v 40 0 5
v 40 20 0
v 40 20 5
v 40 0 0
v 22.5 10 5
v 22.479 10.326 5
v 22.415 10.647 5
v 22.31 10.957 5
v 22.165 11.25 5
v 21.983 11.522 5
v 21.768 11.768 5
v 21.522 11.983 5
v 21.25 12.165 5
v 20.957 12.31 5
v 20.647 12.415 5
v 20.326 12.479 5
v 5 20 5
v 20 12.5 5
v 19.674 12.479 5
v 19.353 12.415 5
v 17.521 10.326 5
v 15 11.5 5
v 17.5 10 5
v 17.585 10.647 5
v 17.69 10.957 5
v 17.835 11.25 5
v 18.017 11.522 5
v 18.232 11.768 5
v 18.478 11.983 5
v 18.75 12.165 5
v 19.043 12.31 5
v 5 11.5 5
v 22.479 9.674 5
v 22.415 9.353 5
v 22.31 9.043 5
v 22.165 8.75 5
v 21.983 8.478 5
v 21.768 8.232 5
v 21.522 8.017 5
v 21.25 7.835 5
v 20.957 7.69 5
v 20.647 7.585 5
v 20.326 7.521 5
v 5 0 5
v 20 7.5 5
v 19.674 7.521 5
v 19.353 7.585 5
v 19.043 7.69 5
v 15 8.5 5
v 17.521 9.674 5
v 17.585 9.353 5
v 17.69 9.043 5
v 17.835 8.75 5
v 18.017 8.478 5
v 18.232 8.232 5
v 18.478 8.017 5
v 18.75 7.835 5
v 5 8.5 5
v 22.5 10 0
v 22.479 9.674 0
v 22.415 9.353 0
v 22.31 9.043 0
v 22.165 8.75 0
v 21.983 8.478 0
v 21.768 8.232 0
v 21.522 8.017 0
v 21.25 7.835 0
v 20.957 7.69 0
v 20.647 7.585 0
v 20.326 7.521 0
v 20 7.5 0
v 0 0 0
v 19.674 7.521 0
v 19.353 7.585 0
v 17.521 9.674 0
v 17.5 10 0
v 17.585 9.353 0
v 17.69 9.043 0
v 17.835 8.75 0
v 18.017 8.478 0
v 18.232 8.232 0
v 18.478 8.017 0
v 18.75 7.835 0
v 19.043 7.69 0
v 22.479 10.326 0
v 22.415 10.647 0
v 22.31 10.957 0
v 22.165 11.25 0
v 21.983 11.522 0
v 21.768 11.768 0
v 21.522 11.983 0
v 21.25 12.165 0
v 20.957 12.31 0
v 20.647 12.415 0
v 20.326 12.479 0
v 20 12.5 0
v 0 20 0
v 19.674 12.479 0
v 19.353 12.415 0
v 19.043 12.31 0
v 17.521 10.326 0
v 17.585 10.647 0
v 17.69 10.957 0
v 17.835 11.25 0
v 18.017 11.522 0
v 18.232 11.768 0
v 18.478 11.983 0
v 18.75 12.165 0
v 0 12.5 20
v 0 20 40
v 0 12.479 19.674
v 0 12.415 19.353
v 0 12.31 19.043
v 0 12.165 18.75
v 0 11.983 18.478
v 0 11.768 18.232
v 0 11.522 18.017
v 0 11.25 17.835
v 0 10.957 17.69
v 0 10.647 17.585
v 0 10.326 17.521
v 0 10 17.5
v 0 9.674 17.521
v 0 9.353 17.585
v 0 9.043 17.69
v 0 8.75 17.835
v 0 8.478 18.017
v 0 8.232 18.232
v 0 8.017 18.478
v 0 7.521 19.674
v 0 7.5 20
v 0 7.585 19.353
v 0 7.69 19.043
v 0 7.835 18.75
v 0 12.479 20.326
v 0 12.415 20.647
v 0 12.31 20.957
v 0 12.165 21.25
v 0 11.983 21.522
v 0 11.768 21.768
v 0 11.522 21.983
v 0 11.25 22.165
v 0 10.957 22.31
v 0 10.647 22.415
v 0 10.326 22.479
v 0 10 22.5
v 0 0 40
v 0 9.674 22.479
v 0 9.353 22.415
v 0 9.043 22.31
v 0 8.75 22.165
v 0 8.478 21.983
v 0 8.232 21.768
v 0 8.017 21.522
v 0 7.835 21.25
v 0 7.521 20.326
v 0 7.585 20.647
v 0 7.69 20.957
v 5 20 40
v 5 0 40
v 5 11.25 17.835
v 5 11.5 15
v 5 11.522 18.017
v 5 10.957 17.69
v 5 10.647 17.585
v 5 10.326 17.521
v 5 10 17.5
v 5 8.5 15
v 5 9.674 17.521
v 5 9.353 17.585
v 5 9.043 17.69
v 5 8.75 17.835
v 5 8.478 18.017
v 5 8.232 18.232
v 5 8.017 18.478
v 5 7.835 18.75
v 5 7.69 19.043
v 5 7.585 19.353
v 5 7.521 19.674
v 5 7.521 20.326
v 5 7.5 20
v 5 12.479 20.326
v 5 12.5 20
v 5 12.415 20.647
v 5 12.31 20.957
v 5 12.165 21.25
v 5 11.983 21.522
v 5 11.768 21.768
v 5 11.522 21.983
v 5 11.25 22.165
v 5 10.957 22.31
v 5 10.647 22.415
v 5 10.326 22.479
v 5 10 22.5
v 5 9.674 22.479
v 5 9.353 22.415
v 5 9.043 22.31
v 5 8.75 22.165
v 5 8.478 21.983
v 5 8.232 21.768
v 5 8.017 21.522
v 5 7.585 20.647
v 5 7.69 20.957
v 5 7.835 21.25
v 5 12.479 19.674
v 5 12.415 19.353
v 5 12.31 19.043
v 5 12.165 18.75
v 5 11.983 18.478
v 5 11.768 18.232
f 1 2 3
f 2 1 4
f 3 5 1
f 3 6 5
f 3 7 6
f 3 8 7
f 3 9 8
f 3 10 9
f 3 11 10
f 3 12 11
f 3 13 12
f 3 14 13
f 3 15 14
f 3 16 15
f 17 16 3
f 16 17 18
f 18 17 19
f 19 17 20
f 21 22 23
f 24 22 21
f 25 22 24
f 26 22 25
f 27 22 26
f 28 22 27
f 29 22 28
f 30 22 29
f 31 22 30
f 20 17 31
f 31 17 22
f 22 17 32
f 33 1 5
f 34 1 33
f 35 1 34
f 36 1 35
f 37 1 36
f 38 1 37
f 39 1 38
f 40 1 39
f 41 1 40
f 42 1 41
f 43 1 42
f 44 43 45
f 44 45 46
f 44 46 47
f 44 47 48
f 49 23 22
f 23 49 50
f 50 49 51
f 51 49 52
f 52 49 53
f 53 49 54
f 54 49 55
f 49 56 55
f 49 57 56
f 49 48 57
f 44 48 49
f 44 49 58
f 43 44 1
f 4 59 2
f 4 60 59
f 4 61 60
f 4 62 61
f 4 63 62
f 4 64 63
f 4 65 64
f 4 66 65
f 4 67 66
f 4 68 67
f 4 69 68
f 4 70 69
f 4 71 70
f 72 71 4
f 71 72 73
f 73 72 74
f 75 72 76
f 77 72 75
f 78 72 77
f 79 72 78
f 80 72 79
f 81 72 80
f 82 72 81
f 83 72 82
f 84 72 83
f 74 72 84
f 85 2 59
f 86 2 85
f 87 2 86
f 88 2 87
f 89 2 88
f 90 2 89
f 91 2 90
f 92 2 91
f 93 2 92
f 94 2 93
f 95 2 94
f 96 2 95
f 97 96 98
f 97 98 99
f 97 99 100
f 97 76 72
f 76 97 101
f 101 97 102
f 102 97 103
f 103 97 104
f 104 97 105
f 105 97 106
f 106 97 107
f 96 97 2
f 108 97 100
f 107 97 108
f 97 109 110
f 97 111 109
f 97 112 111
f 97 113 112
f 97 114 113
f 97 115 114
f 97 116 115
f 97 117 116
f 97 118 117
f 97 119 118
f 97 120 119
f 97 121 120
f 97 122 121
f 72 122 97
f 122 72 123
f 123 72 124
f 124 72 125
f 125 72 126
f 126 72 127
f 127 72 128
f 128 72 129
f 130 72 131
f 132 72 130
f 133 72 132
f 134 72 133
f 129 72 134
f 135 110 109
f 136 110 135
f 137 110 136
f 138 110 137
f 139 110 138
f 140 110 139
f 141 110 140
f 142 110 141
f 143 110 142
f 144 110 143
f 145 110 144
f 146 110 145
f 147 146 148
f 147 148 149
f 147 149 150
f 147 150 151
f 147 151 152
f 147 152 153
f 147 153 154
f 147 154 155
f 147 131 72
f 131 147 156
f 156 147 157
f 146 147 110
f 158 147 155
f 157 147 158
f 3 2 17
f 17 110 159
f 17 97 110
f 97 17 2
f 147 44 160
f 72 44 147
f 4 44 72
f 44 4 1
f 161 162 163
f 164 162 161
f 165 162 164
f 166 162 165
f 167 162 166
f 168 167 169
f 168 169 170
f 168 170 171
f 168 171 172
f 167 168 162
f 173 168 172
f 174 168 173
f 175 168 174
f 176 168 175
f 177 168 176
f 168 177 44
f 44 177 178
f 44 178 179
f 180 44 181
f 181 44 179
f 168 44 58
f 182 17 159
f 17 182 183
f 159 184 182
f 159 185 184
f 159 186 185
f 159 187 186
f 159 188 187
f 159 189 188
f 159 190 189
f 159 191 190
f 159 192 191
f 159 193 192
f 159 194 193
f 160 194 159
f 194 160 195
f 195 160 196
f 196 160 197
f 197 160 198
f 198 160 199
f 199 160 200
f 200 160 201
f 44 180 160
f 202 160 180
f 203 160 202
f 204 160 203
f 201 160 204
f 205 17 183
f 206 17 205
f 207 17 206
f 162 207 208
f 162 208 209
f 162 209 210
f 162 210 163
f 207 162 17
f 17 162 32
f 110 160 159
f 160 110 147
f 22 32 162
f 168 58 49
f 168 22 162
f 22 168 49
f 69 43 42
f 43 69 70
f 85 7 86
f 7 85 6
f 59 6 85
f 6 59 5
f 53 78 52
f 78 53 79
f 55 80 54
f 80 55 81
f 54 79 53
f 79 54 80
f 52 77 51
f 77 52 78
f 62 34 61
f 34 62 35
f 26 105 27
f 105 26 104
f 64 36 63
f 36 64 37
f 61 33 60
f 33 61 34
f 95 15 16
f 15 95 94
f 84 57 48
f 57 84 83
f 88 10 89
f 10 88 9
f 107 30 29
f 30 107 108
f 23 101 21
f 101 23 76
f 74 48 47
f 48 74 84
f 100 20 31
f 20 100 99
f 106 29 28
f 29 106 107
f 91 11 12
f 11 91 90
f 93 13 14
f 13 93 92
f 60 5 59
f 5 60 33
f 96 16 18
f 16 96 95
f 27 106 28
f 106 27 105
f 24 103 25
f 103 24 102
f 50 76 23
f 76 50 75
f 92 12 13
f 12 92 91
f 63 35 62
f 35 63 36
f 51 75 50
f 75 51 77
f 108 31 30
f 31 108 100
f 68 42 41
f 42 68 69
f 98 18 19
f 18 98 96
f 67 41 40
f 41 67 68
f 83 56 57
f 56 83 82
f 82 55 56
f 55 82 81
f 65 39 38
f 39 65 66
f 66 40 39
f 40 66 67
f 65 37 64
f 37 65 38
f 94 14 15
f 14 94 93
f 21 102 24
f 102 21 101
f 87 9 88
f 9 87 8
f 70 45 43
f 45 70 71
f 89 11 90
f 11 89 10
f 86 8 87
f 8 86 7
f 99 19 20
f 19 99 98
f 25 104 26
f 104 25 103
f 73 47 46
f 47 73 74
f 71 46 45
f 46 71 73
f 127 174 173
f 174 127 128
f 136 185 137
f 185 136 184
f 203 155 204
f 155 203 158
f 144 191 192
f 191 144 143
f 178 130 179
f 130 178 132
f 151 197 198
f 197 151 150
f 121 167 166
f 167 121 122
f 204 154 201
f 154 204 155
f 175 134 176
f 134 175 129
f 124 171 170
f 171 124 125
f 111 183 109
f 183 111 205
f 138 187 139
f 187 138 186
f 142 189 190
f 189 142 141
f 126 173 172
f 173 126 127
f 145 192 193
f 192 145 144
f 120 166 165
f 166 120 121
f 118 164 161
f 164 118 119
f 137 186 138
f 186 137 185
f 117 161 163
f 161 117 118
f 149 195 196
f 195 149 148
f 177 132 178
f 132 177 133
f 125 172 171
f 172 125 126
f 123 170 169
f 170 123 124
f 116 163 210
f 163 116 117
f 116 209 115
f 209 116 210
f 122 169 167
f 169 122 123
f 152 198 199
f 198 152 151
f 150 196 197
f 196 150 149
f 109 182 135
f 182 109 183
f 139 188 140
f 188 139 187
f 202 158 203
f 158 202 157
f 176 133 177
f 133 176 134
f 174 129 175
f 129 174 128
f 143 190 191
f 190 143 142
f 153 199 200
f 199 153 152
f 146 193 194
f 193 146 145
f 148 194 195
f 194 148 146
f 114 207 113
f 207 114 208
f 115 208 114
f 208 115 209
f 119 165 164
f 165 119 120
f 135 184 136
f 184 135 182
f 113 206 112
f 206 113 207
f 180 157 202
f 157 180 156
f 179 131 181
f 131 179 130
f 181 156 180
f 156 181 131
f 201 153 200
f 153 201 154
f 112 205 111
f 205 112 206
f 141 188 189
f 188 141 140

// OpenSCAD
// 2020 extrusion corner bracket
// A right-angle bracket for bolting two lengths of 2020 aluminium extrusion
// together. Written as a Datum seed part: everything configurable is declared
// with Customizer annotations, and it depends on no external libraries.

/* [Bracket] */
// Length of each arm
arm = 40; // [20:5:80]
// Thickness of the bracket body
thickness = 5; // [3:0.5:10]
// Width across the bracket
width = 20; // [10:1:40]

/* [Fasteners] */
// Bolt diameter
bolt_d = 5; // [3:0.5:8]
// Distance from the inside corner to the first hole
first_hole = 20; // [10:1:30]
// Bolt holes per arm
holes = 1; // [1:1:3]
// Centre-to-centre spacing between holes
hole_pitch = 20; // [10:1:40]

/* [Reinforcement] */
// Add a triangular gusset between the arms
gusset = true;
// Gusset thickness
gusset_t = 3; // [2:0.5:6]

/* [Hidden] */
eps = 0.01;
$fn = 48;

module arm_holes() {
    for (i = [0 : holes - 1])
        translate([first_hole + i * hole_pitch, width / 2, -eps])
            cylinder(d = bolt_d, h = thickness + 2 * eps);
}

// The gusset must stop short of the first bolt hole, or the bolt cannot be
// fitted. Deriving its length from first_hole keeps that true at every setting
// rather than only at the defaults.
gusset_len = max(thickness + 2, min(arm * 0.6, first_hole - bolt_d));

module gusset_shape() {
    translate([0, (width + gusset_t) / 2, 0])
        rotate([90, 0, 0])
            linear_extrude(gusset_t)
                polygon([
                    [thickness, thickness],
                    [gusset_len, thickness],
                    [thickness, gusset_len]
                ]);
}

// The last hole must sit fully inside the arm. Without this, an over-ambitious
// hole count silently produces a bracket with a slot cut out of its end -- the
// kind of quiet wrongness you only discover after printing it.
assert(
    first_hole + (holes - 1) * hole_pitch + bolt_d / 2 <= arm - 1,
    "The last bolt hole falls outside the arm. Lengthen the arm, or reduce holes, hole_pitch or first_hole."
);

module bracket() {
    difference() {
        union() {
            cube([arm, width, thickness]);
            cube([thickness, width, arm]);
            if (gusset) gusset_shape();
        }
        // Holes through the horizontal arm, drilled downwards.
        arm_holes();
        // Holes through the vertical arm, drilled sideways.
        // Note: the range must start at 0. `[1 : holes - 1]` looks like a way to
        // skip the first hole, but when holes == 1 that is [1:0], and OpenSCAD
        // reverses a backwards range rather than iterating zero times.
        for (i = [0 : holes - 1])
            translate([-eps, width / 2, first_hole + i * hole_pitch])
                rotate([0, 90, 0])
                    cylinder(d = bolt_d, h = thickness + 2 * eps);
    }
}

bracket();
